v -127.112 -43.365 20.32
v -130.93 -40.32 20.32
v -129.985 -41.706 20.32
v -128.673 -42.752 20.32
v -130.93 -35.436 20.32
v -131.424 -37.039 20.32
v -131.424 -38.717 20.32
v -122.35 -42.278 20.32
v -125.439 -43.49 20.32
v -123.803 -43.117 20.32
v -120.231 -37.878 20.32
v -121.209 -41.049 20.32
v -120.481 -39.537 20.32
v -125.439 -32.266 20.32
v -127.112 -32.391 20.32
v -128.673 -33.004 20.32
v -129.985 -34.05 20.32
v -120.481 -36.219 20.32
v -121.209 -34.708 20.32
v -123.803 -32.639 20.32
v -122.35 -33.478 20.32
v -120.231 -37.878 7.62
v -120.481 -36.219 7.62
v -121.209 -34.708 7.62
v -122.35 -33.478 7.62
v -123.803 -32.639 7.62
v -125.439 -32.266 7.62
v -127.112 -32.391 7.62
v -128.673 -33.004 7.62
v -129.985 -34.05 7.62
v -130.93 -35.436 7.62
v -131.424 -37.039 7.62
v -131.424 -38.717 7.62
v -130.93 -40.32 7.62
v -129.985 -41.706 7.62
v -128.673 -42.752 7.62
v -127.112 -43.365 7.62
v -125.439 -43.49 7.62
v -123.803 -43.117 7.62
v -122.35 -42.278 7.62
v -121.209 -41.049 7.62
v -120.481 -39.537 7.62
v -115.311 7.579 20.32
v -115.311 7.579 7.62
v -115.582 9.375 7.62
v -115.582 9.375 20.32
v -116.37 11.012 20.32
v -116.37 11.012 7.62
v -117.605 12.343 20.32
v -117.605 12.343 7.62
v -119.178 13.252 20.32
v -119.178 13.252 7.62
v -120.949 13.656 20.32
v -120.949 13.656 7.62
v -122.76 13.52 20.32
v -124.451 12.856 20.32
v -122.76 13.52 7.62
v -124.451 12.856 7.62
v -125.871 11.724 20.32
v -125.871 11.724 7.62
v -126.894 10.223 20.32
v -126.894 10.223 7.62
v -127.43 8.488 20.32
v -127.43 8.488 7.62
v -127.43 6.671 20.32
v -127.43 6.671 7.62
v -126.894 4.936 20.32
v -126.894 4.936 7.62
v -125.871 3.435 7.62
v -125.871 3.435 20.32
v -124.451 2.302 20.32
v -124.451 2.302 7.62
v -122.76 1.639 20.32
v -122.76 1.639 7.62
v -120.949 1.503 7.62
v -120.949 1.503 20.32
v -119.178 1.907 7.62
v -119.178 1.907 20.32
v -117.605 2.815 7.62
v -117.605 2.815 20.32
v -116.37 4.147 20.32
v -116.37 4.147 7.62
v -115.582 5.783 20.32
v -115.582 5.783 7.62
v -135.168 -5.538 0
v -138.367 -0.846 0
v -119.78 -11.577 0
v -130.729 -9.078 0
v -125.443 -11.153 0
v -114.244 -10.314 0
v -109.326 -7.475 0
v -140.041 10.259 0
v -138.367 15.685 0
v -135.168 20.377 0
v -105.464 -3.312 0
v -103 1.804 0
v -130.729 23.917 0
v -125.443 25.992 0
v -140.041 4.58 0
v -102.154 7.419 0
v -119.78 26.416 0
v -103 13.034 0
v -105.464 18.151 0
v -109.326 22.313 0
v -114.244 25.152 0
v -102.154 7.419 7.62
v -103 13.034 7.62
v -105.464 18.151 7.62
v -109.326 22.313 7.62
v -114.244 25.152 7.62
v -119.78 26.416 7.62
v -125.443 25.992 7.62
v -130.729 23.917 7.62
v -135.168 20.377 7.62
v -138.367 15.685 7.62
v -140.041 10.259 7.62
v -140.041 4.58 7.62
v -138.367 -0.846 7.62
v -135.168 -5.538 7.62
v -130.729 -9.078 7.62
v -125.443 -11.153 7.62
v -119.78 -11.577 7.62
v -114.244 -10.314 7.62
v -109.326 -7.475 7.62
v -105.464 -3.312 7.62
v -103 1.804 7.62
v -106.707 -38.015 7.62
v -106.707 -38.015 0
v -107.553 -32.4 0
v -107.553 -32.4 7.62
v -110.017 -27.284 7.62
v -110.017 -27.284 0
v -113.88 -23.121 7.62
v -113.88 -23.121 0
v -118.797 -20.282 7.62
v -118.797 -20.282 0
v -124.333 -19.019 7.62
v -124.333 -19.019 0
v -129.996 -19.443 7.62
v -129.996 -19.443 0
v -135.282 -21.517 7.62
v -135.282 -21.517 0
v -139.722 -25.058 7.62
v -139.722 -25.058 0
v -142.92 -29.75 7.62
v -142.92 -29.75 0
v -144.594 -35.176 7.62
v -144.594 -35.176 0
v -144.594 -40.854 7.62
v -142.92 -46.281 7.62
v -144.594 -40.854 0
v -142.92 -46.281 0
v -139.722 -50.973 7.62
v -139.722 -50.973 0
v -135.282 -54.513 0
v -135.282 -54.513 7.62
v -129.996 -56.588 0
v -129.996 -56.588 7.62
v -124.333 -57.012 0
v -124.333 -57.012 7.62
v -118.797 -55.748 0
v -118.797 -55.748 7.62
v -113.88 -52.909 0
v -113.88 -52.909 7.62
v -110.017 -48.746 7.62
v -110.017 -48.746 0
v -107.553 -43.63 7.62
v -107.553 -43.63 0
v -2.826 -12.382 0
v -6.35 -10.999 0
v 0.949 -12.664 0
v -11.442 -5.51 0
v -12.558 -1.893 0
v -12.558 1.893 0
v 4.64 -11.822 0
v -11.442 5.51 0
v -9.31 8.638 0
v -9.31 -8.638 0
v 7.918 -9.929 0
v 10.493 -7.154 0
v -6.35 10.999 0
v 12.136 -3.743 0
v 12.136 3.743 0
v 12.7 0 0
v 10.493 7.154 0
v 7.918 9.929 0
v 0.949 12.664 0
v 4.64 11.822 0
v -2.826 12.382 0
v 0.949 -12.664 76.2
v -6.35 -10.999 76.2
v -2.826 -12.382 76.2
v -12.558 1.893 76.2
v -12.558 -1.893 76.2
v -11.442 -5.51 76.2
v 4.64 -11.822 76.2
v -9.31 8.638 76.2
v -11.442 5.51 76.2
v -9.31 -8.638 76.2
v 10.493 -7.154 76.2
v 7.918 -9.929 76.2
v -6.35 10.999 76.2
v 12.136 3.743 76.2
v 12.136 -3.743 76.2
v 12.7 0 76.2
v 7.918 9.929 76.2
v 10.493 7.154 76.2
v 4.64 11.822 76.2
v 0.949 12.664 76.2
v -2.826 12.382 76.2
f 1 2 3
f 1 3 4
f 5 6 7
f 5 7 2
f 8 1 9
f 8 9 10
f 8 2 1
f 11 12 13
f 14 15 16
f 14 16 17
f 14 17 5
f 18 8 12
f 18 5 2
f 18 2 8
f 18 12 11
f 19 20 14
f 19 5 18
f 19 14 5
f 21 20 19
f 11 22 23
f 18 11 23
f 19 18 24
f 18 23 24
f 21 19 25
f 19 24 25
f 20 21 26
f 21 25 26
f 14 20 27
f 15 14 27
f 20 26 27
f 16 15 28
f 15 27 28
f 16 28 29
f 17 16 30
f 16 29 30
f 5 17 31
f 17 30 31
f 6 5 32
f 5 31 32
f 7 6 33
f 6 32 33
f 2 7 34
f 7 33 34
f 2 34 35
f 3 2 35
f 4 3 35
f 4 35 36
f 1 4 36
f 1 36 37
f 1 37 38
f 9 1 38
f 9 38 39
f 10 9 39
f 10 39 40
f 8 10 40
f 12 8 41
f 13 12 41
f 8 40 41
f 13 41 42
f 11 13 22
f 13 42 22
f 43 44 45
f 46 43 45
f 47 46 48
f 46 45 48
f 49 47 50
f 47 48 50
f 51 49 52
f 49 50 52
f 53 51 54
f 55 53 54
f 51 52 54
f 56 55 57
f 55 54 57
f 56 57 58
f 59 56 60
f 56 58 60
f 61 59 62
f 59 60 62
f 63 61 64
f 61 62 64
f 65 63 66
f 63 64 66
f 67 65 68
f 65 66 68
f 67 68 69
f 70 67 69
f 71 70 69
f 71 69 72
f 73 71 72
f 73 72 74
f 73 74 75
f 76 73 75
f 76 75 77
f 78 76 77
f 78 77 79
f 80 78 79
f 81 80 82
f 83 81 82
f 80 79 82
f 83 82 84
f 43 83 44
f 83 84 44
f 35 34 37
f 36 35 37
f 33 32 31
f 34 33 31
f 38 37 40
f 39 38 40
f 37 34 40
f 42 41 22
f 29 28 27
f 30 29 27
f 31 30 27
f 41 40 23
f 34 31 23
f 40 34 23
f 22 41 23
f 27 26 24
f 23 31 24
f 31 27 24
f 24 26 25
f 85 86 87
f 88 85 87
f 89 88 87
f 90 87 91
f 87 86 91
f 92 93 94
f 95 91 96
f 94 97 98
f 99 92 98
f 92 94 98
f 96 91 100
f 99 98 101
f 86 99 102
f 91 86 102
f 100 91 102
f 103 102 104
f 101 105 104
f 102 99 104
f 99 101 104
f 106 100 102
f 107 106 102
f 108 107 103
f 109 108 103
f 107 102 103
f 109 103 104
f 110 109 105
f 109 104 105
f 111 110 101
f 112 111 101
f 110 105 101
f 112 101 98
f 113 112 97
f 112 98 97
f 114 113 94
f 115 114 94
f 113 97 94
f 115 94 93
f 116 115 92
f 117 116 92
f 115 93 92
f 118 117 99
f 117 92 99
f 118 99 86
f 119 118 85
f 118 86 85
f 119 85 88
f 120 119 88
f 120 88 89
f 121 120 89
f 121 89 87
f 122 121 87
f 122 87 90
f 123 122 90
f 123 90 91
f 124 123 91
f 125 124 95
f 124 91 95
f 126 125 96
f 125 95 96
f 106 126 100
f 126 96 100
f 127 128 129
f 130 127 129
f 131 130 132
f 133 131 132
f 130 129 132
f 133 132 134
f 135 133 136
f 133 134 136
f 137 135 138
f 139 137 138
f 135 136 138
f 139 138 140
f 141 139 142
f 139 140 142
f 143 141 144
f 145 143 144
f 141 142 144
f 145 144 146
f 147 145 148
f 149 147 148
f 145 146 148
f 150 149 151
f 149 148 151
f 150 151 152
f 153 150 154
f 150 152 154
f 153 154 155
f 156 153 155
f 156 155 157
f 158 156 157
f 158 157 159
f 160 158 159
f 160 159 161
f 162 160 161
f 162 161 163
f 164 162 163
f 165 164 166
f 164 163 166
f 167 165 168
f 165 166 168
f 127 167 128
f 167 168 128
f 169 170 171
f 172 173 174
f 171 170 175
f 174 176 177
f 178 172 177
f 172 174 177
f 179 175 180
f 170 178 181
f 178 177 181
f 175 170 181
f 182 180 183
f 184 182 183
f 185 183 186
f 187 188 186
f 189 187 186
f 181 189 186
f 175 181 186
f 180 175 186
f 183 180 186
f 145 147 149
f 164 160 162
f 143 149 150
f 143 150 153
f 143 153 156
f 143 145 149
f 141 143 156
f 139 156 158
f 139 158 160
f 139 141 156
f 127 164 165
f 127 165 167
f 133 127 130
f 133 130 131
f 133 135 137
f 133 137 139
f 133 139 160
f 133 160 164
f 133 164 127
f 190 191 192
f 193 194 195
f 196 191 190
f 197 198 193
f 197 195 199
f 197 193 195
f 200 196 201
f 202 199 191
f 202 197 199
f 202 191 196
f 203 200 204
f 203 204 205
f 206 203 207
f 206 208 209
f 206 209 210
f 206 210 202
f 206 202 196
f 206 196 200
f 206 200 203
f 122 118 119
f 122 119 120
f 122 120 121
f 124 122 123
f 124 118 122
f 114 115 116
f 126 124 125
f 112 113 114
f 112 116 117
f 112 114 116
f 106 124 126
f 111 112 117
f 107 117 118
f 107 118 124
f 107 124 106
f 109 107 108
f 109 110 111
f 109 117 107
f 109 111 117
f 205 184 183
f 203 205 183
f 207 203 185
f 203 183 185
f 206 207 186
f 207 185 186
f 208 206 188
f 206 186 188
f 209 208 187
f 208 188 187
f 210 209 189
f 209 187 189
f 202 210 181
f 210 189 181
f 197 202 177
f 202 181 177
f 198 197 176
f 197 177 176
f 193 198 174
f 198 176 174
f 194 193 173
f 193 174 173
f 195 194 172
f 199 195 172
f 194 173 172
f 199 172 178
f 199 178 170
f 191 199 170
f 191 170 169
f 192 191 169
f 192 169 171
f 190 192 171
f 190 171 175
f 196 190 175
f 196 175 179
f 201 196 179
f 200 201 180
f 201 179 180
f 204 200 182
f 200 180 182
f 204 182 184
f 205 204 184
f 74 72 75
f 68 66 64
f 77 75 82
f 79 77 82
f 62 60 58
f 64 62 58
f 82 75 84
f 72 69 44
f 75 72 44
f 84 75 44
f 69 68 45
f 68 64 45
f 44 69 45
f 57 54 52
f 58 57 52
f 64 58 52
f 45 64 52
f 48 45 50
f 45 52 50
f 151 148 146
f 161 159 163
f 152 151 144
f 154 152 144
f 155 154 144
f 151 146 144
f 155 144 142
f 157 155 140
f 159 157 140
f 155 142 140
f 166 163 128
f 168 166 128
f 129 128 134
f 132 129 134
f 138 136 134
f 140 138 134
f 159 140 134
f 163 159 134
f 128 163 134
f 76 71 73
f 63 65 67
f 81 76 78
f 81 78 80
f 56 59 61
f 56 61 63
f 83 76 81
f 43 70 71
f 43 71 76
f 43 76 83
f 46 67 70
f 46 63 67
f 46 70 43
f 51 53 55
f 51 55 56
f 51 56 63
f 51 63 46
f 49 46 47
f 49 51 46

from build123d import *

# Parameters (mm, degrees)
F0_R     = 19.05
F1_DEPTH = 7.62
F2_R     = 12.7
F3_DEPTH = 76.2
F5_R     = 6.093414
F5_R_2   = 5.628032
F6_DEPTH = 12.7


with BuildPart() as f1:
    # F0 (on Top) → F1 (new body)
    with BuildSketch(Plane.XY):
        with Locations((-121.203709, 7.419322)):
            Circle(F0_R)
        with Locations((-125.756985, -38.015233)):
            Circle(F0_R)
    extrude(amount=F1_DEPTH)


with BuildPart() as f3:
    # F2 (on Top) → F3 (new body)
    with BuildSketch(Plane.XY):
        Circle(F2_R)
    extrude(amount=F3_DEPTH)


with BuildPart() as f6:
    # F5 (on offset) → F6 (new body)
    with BuildSketch(Plane.XY.offset(7.62)):
        with Locations((-121.404257, 7.579375)):
            Circle(F5_R)
        with Locations((-125.859246, -37.878152)):
            Circle(F5_R_2)
    extrude(amount=F6_DEPTH)


solid = Compound([f1.part, f3.part, f6.part])
